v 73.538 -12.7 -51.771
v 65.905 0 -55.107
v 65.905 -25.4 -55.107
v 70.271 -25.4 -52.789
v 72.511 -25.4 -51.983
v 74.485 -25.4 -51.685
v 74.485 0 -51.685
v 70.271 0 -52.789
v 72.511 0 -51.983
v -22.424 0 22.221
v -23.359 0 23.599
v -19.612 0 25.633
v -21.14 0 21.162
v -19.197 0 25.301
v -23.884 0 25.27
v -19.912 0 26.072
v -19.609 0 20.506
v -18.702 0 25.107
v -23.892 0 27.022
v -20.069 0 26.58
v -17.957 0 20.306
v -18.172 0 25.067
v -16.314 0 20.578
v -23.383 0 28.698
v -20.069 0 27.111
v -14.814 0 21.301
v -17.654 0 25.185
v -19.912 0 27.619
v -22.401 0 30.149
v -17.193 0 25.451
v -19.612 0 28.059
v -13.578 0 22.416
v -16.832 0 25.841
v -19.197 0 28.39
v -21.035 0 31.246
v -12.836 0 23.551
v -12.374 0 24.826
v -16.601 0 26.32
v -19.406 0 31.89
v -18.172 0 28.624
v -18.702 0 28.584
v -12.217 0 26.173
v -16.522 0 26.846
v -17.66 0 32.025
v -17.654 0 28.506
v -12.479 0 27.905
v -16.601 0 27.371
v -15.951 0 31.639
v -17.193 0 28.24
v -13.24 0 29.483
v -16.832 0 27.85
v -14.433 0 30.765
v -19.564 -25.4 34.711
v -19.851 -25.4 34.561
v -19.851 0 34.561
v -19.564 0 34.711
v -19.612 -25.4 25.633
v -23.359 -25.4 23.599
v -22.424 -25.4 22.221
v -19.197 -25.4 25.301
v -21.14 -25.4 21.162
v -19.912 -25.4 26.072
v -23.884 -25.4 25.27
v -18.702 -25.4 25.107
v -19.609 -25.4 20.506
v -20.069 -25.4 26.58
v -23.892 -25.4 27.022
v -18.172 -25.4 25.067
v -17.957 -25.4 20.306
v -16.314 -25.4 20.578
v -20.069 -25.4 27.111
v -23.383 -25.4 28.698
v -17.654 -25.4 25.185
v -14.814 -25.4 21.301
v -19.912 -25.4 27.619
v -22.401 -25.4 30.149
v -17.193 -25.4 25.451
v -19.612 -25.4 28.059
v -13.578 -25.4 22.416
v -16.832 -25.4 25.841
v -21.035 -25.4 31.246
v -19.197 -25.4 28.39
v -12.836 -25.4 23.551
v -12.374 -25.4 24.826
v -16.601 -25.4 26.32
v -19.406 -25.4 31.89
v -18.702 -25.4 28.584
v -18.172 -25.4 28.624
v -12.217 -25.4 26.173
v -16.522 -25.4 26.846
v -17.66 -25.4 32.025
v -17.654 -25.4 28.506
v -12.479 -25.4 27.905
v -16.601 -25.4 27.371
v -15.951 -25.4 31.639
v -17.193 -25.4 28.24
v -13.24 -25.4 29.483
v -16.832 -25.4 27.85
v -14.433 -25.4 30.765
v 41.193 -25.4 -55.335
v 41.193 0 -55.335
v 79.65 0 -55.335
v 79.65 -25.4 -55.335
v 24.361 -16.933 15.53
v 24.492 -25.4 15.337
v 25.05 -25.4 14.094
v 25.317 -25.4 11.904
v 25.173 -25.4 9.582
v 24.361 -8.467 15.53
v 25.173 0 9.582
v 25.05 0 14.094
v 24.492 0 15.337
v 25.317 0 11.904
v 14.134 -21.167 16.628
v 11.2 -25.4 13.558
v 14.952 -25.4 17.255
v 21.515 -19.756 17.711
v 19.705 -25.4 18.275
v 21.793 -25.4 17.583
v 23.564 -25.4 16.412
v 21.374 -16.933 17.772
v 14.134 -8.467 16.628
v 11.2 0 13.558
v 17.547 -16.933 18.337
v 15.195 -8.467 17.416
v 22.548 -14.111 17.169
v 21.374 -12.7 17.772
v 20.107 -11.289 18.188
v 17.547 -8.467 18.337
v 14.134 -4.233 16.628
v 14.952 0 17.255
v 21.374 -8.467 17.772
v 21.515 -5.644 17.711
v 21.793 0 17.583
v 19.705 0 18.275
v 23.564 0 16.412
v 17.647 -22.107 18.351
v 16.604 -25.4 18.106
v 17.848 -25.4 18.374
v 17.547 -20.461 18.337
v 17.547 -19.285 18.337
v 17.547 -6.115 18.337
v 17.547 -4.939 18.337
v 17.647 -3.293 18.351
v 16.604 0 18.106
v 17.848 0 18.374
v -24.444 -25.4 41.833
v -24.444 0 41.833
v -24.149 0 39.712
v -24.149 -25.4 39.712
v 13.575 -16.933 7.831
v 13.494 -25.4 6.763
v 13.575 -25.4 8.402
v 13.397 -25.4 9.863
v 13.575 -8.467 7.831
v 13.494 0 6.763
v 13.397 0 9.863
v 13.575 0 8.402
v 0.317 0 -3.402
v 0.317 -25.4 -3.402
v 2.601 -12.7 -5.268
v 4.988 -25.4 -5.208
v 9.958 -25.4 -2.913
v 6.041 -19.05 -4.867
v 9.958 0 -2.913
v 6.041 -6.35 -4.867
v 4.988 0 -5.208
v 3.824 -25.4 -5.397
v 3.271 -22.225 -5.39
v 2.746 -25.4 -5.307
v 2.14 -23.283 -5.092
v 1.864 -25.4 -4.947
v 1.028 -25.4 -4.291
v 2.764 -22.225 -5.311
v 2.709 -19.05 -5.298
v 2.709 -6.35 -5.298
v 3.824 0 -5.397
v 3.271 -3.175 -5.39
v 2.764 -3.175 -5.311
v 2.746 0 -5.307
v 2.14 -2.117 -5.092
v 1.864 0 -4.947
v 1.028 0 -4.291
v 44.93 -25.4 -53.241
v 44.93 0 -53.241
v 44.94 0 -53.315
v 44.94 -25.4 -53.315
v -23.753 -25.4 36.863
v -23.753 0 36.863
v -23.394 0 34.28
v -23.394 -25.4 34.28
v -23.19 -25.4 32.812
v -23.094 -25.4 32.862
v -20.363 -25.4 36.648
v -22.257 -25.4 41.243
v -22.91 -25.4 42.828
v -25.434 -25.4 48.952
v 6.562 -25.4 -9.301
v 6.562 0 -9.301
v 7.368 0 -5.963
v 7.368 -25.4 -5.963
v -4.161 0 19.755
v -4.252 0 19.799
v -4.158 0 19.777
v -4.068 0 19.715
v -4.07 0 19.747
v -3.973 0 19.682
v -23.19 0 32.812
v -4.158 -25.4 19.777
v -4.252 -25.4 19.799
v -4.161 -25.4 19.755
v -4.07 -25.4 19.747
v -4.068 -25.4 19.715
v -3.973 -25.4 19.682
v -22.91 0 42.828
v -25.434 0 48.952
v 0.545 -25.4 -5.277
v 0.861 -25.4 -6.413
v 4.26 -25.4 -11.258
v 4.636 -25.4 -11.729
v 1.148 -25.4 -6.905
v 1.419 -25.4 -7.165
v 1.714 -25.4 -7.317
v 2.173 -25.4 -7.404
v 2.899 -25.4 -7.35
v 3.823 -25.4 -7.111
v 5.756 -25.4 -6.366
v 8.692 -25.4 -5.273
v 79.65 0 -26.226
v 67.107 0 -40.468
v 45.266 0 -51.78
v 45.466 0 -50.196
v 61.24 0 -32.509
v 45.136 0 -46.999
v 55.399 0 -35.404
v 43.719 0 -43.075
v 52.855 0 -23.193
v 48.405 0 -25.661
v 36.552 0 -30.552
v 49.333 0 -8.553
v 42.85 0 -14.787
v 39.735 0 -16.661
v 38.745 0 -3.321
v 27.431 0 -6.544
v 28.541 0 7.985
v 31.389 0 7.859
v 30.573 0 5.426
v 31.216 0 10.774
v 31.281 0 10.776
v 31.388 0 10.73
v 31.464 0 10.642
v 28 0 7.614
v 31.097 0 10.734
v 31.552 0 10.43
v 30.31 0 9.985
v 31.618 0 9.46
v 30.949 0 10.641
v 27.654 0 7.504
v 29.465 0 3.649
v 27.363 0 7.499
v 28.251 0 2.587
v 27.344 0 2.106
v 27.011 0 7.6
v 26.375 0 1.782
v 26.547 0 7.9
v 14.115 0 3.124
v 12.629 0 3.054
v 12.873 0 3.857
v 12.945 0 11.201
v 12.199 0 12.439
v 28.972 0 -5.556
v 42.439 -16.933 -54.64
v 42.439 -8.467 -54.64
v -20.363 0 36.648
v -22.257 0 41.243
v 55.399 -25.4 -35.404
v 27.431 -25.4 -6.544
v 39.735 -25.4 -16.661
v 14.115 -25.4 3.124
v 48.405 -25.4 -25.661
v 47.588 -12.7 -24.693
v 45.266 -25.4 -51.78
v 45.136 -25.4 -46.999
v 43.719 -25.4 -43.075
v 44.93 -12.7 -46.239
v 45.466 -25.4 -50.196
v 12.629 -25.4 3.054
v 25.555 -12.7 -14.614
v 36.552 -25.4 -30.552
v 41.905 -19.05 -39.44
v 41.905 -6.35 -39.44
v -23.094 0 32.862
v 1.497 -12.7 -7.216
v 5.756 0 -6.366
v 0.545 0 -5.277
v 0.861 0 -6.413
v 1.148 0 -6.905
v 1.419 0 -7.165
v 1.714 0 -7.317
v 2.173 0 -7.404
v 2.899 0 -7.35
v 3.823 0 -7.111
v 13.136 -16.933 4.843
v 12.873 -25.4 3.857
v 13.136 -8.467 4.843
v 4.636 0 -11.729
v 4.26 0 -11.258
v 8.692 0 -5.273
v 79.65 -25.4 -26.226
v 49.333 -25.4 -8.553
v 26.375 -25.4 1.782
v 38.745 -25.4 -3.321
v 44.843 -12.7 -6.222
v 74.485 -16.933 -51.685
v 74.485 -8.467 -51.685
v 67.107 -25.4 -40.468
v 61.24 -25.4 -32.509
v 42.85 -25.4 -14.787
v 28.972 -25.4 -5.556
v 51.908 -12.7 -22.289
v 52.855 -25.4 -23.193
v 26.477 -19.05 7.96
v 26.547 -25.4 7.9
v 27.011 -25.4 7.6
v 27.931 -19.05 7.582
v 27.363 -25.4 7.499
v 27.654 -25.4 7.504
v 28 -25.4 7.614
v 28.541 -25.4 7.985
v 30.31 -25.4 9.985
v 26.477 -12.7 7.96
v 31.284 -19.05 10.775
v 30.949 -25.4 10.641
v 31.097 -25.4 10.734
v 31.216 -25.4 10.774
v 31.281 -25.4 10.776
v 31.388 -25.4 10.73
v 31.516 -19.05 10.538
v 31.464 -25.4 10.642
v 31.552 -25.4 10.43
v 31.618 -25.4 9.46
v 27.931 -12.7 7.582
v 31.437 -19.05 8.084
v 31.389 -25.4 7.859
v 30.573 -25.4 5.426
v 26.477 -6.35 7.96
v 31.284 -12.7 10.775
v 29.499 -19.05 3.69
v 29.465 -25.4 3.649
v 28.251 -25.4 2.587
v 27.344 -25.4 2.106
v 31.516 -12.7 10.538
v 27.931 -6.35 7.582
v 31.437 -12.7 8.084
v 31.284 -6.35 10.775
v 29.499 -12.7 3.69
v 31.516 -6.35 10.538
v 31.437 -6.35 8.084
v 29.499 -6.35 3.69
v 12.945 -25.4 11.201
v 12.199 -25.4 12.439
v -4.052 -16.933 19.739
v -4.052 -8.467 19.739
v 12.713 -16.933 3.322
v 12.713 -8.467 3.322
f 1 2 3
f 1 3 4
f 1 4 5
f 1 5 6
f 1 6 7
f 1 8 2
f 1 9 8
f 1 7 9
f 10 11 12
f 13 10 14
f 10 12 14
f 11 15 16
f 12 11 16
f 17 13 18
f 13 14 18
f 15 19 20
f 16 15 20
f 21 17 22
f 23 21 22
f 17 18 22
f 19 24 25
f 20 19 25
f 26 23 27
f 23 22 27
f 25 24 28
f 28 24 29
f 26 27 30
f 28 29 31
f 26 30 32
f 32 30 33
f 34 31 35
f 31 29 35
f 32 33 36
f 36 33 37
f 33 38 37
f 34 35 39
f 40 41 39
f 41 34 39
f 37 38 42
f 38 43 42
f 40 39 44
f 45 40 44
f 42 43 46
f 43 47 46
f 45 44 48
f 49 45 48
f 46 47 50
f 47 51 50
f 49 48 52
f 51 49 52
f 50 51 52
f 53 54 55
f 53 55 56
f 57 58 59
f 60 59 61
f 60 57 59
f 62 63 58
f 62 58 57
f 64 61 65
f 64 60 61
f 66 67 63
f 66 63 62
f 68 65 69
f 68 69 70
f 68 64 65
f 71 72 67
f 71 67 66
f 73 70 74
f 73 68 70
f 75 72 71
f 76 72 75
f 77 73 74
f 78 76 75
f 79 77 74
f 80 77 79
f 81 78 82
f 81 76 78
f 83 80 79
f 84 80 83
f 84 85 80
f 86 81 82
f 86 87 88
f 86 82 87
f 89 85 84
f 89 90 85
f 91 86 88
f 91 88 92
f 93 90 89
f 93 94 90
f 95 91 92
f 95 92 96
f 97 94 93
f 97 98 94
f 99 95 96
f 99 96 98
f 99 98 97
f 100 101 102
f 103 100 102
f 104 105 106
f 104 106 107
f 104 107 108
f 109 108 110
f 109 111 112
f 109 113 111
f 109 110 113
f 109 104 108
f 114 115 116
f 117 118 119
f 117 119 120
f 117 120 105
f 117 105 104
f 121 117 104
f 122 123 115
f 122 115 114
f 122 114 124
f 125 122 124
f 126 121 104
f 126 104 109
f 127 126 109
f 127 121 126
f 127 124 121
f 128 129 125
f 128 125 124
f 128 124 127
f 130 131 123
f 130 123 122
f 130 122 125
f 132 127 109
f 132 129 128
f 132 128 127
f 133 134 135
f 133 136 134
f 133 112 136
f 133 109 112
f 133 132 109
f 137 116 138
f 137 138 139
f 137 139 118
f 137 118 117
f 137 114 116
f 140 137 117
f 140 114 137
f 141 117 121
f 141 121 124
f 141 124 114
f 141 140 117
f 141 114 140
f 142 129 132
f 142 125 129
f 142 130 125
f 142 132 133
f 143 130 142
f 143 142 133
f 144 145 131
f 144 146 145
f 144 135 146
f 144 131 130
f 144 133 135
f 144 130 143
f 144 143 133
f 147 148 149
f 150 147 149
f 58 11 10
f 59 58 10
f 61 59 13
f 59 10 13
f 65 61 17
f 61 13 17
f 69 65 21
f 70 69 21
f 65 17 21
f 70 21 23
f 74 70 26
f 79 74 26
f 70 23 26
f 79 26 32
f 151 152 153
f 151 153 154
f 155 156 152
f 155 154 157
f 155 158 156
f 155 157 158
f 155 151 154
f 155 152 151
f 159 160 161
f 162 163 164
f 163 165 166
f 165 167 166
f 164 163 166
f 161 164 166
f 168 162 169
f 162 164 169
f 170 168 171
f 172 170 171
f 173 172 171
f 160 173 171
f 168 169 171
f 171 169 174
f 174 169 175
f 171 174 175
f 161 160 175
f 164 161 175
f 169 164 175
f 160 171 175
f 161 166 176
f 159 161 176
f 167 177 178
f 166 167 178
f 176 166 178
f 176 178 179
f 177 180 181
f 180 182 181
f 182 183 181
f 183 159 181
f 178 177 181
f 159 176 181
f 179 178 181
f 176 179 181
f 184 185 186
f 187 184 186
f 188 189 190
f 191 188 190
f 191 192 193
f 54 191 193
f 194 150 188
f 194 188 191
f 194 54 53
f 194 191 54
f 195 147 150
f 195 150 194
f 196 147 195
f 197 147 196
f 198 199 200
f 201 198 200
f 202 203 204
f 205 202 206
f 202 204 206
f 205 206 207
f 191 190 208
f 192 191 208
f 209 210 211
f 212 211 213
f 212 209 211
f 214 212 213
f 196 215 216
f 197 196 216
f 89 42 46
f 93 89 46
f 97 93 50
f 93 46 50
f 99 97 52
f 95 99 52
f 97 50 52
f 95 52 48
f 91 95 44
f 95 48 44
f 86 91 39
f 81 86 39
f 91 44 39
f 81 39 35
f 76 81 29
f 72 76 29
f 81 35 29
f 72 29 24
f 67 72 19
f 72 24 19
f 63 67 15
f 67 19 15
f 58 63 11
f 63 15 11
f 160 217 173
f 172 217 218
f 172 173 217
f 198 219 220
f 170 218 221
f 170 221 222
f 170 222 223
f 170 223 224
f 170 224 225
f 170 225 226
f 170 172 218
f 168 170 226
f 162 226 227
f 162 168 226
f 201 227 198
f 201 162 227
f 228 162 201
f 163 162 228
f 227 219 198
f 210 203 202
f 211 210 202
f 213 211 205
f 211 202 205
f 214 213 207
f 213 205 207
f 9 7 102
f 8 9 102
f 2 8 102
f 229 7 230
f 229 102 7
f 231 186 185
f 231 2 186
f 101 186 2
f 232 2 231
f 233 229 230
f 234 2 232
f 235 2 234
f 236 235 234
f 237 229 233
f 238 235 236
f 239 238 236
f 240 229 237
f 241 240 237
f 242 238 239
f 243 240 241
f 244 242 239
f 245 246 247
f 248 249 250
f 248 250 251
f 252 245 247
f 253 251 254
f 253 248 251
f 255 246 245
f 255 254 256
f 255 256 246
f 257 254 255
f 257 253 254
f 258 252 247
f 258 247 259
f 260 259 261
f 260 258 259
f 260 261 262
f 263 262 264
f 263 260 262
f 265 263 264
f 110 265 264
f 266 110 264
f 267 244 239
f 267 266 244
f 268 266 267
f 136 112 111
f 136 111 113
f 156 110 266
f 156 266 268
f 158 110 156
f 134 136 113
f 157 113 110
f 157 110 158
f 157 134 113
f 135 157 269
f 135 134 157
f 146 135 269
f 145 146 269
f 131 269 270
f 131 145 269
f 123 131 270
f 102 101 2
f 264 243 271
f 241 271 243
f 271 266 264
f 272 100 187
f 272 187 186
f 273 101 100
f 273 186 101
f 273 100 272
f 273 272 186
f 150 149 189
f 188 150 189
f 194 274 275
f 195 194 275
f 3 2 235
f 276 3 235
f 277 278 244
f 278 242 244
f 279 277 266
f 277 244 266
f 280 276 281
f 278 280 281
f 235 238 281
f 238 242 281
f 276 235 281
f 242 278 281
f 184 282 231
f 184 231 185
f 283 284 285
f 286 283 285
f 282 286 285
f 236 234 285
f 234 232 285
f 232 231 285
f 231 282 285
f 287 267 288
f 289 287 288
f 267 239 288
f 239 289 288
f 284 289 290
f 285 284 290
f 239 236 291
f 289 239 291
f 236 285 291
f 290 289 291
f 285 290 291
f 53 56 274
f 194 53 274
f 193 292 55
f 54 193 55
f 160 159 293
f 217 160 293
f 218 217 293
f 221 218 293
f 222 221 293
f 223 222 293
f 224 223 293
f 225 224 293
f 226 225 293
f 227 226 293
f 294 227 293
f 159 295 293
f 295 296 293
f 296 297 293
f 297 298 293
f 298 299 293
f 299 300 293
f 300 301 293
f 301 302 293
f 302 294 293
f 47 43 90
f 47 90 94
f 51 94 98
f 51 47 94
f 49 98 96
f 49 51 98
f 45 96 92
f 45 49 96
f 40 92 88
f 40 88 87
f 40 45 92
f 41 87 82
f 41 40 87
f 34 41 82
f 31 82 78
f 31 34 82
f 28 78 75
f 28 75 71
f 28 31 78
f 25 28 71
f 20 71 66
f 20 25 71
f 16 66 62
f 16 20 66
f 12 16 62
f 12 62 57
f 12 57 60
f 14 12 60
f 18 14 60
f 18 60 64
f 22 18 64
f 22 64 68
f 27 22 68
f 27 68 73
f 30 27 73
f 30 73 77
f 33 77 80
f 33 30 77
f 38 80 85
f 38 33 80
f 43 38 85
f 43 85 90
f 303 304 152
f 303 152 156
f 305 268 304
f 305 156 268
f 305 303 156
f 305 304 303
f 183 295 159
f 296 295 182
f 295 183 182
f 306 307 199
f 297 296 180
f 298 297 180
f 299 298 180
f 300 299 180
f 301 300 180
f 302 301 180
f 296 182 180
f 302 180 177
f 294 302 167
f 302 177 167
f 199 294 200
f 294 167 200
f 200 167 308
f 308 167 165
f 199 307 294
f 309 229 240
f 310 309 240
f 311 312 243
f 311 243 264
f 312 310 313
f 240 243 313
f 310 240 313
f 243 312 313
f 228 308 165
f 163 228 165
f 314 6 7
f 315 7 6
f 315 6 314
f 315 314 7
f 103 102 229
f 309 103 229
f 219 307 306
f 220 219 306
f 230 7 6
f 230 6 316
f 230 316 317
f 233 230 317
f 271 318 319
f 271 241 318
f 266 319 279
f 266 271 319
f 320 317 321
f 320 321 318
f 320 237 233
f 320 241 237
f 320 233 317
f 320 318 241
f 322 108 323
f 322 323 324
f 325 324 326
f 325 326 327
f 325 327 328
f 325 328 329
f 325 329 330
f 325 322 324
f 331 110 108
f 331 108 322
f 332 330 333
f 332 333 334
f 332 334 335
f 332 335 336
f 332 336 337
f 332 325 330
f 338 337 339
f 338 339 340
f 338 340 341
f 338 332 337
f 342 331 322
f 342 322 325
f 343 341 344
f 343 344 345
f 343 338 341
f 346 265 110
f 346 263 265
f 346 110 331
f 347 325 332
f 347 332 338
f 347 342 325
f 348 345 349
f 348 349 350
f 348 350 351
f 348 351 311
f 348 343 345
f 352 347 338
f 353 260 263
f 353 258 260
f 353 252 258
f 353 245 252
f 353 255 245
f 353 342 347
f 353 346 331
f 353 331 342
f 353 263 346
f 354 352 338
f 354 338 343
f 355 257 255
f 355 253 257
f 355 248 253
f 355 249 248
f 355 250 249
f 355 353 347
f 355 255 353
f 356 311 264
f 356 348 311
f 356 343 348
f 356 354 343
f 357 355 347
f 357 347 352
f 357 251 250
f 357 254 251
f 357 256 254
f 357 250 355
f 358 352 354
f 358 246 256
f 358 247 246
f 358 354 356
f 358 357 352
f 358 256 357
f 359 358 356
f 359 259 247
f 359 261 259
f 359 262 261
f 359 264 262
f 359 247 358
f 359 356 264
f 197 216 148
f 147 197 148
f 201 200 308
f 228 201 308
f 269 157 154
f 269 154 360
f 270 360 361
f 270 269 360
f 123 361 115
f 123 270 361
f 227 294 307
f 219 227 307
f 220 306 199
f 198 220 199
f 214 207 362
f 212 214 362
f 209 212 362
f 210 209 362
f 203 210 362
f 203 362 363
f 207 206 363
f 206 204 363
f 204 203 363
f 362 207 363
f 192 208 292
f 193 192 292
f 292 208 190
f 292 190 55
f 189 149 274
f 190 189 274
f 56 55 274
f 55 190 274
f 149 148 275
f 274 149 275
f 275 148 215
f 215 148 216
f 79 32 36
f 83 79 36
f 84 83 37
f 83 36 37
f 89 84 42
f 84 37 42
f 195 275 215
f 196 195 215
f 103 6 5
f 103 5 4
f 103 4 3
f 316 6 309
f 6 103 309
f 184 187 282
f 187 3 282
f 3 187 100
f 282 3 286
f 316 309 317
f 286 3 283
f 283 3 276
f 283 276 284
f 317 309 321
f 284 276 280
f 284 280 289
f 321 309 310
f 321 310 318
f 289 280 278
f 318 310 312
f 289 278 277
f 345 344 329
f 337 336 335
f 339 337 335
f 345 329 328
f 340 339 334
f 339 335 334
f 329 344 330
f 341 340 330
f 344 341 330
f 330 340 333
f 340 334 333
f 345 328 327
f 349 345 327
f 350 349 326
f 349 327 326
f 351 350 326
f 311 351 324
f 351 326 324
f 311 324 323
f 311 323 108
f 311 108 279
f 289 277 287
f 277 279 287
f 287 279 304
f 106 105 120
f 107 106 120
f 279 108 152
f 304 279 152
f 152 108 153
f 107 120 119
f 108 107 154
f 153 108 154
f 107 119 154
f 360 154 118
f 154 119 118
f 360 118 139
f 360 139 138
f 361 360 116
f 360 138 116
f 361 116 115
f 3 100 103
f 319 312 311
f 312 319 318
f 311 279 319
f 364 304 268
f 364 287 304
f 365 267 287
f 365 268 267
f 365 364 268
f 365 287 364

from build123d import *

# Parameters (mm, degrees)
F1_DEPTH = 25.4
F0_R     = 1.7834628767


with BuildPart() as f1:
    # F0 (on Front) → F1 (new body)
    with BuildSketch(Plane.XZ):
        Polygon((-22.9100676942, 42.8284476999), (-25.4338644445, 48.9523671567), (-24.4440726353, 41.833478334), align=None)
        Polygon((-22.9100676942, 42.8284476999), (-24.4440726353, 41.833478334), (-24.1491642219, 39.7124058128), (-22.2565439392, 41.242691304), align=None)
        Polygon((-22.2565439392, 41.242691304), (-24.1491642219, 39.7124058128), (-23.7530106851, 36.8631470503), (-21.2160514777, 38.7179665895), align=None)
        Polygon((-21.2160514777, 38.7179665895), (-23.7530106851, 36.8631470503), (-23.3938598176, 34.2800229301), (-20.3630941983, 36.6482905434), align=None)
        with BuildLine():
            Line((-20.3630941983, 36.6482905434), (-23.3938598176, 34.2800229301))
            Line((-23.3938598176, 34.2800229301), (-23.1896936893, 32.8115969896))
            Line((-23.1896936893, 32.8115969896), (-23.0944005255, 32.861512475))
            ThreePointArc((-23.0944005255, 32.861512475), (-21.536076112, 33.8323842773), (-19.8506553661, 34.5606177173))
            Line((-19.8506553661, 34.5606177173), (-19.5644944906, 34.7105115652))
            Line((-19.5644944906, 34.7105115652), (-20.3630941983, 36.6482905434))
        make_face()
        with BuildLine():
            ThreePointArc((-19.8506553661, 34.5606177173), (-21.536076112, 33.8323842773), (-23.0944005255, 32.861512475))
            Line((-23.0944005255, 32.861512475), (-19.8506553661, 34.5606177173))
        make_face()
    extrude(amount=F1_DEPTH)


with BuildPart() as f1b:
    # F0 (on Front) → F1, piece 2 (new body)
    with BuildSketch(Plane.XZ):
        with BuildLine():
            Line((7.3678023182, -5.9633478522), (8.6915092543, -5.2727186121))
            Line((8.6915092543, -5.2727186121), (9.9576627836, -2.9130687471))
            add(Edge.make_bspline(
                [(9.9576627836, -2.9130687471), (7.2934083331, -4.3884854622), (3.4390867087, -6.5229402058), (0.9154172603, -4.321786708), (0.3169151371, -3.4018067018)],
                knots=[0, 0, 0, 0, 0.2804208607, 0.4056790399, 0.4056790399, 0.4056790399, 0.4056790399], degree=3))
            add(Edge.make_bspline(
                [(0.3169151371, -3.4018067018), (0.4735126403, -5.0509317641), (0.7934307177, -8.4199824116), (4.079017662, -7.0603283138), (5.7563344017, -6.3662147149)],
                knots=[0, 0, 0, 0, 0.4894925113, 1, 1, 1, 1], degree=3))
            Line((5.7563344017, -6.3662147149), (7.3678023182, -5.9633478522))
        make_face()
        Polygon((6.5620685928, -9.3013895676), (7.3678023182, -5.9633478522), (5.7563344017, -6.3662147149), (4.2599714361, -11.2581718713), (4.6356988207, -11.7292987501), align=None)
    extrude(amount=F1_DEPTH)


with BuildPart() as f1c:
    # F0 (on Front) → F1, piece 3 (new body)
    with BuildSketch(Plane.XZ):
        with BuildLine():
            add(Edge.make_bspline(
                [(11.1995394877, 13.5578365372), (13.102668093, 15.7551518419), (16.8397830976, 20.0703916826), (25.7752520583, 16.2097157192), (25.3665615723, 11.7141237547), (25.172656402, 9.5816049725)],
                knots=[0, 0, 0, 0, 0.3530775685, 0.6931085154, 1, 1, 1, 1], degree=3))
            add(Edge.make_bspline(
                [(13.3967538173, 9.8631651647), (13.3099779159, 10.2531594082), (12.8857542425, 11.599367998), (11.9969733927, 12.8016439042), (11.1995394877, 13.5578365372)],
                knots=[0.3052767295, 0.3052767295, 0.3052767295, 0.3052767295, 0.3430149898, 0.4390412883, 0.4390412883, 0.4390412883, 0.4390412883], degree=3))
            add(Edge.make_bspline(
                [(26.3748617337, 1.7824834694), (24.4786632438, 1.3069342857), (19.4102807977, 2.0805751093), (16.182781783, 6.7144995217), (15.164352776, 10.8239090423), (13.8978703904, 10.1356632019), (13.3967538173, 9.8631651647)],
                knots=[0.5136939443, 0.5136939443, 0.5136939443, 0.5136939443, 0.6337715162, 0.8018048617, 0.9214431496, 1, 1, 1, 1], degree=3))
            add(Edge.make_bspline(
                [(25.172656402, 9.5816049725), (26.0256189076, 8.3626269027), (27.8732100394, 5.7222122761), (32.53464609, 14.3338237837), (31.2517450854, 4.1198016009), (27.5567602879, 2.078892783), (26.3748617337, 1.7824834694)],
                knots=[0, 0, 0, 0, 0.1208801505, 0.2618084346, 0.4388497182, 0.5136939443, 0.5136939443, 0.5136939443, 0.5136939443], degree=3))
        make_face()
        with BuildLine():
            add(Edge.make_bspline(
                [(26.3748617337, 1.7824834694), (24.4786632438, 1.3069342857), (19.4102807977, 2.0805751093), (16.182781783, 6.7144995217), (15.164352776, 10.8239090423), (13.8978703904, 10.1356632019), (13.3967538173, 9.8631651647)],
                knots=[0.5136939443, 0.5136939443, 0.5136939443, 0.5136939443, 0.6337715162, 0.8018048617, 0.9214431496, 1, 1, 1, 1], degree=3))
            add(Edge.make_bspline(
                [(13.4936010892, 6.7625090508), (13.6249872982, 7.8467701656), (13.6139755122, 8.8869124365), (13.3967538173, 9.8631651647)],
                knots=[0.2108084645, 0.2108084645, 0.2108084645, 0.2108084645, 0.3052767295, 0.3052767295, 0.3052767295, 0.3052767295], degree=3))
            add(Edge.make_bspline(
                [(23.6649847588, 0.4353575829), (20.3023370373, 2.540814331), (16.8979690633, 4.6516616909), (13.4936010892, 6.7625090508)],
                knots=[0.8849952308, 0.8849952308, 0.8849952308, 0.8849952308, 1, 1, 1, 1], degree=3))
            add(Edge.make_bspline(
                [(79.6498671174, -32.3402956128), (70.7382485823, -25.6757973438), (53.0737396883, -12.4655046811), (33.4090025187, -3.8390916864), (23.6649847588, 0.4353575829)],
                knots=[0, 0, 0, 0, 0.5044928556, 1, 1, 1, 1], degree=3))
            Line((79.6498671174, -32.3402956128), (79.6498671174, -26.2255966663))
            add(Edge.make_bspline(
                [(79.6498671174, -26.2255966663), (67.195591653, -18.7096857526), (45.9244782641, -5.8679201366), (32.1042021144, -0.4631162389), (26.3748617337, 1.7824834694)],
                knots=[0, 0, 0, 0, 0.5854506367, 1, 1, 1, 1], degree=3))
        make_face()
        with BuildLine():
            add(Edge.make_bspline(
                [(23.6649847588, 0.4353575829), (20.3023370373, 2.540814331), (16.8979690633, 4.6516616909), (13.4936010892, 6.7625090508)],
                knots=[0.8849952308, 0.8849952308, 0.8849952308, 0.8849952308, 1, 1, 1, 1], degree=3))
            add(Edge.make_bspline(
                [(12.8726503511, 3.8568314283), (13.1589002344, 4.8499495328), (13.3797309677, 5.8227989722), (13.4936010892, 6.7625090508)],
                knots=[0.1289344772, 0.1289344772, 0.1289344772, 0.1289344772, 0.2108084645, 0.2108084645, 0.2108084645, 0.2108084645], degree=3))
            Line((12.8726503511, 3.8568314283), (14.1145518273, 3.1241918572))
            add(Edge.make_bspline(
                [(74.4853538034, -51.6848177491), (67.8697829303, -41.3749614778), (53.9210289847, -19.6369057455), (27.830793174, -4.7186701674), (14.1145518273, 3.1241918572)],
                knots=[0, 0, 0, 0, 0.474276835, 1, 1, 1, 1], degree=3))
            add(Edge.make_bspline(
                [(74.4853538034, -51.6848177491), (75.2532722885, -50.5569895458), (76.7194981017, -48.4351104873), (78.7055638503, -47.4397782041), (79.6498671174, -46.9699688256)],
                knots=[0, 0, 0, 0, 0.5257876641, 1, 1, 1, 1], degree=3))
            Line((79.6498671174, -46.9699688256), (79.6498671174, -45.374263078))
            add(Edge.make_bspline(
                [(79.6498671174, -45.374263078), (73.9639050001, -38.5749047223), (61.908256077, -24.1585798245), (37.3370442092, -8.1251376623), (23.6649847588, 0.4353575829)],
                knots=[0, 0, 0, 0, 0.417401783, 0.8849952308, 0.8849952308, 0.8849952308, 0.8849952308], degree=3))
        make_face()
        with BuildLine():
            Line((14.1145518273, 3.1241918572), (12.8726503511, 3.8568314283))
            add(Edge.make_bspline(
                [(12.629107162, 3.0539237688), (12.7144569126, 3.3228512302), (12.7959048356, 3.5905697973), (12.8726503511, 3.8568314283)],
                knots=[0.1069835115, 0.1069835115, 0.1069835115, 0.1069835115, 0.1289344772, 0.1289344772, 0.1289344772, 0.1289344772], degree=3))
            add(Edge.make_bspline(
                [(12.629107162, 3.0539237688), (27.4083446688, -16.9764718508), (47.2608873564, -43.8966934003), (45.4056145875, -51.3340987373), (44.9297228388, -53.2412977891)],
                knots=[0.0008687497, 0.0008687497, 0.0008687497, 0.0008687497, 0.743798112, 1, 1, 1, 1], degree=3))
            Line((44.9297228388, -53.2412977891), (44.9400234568, -53.3147102781))
            add(Edge.make_bspline(
                [(44.9400234568, -53.3147102781), (47.4482459083, -52.0674234641), (50.7039411921, -50.8505914393), (54.1312274801, -51.0922982039), (54.888123322, -51.2028494127)],
                knots=[0.1612518221, 0.1612518221, 0.1612518221, 0.1612518221, 0.4835534699, 0.5738587509, 0.5738587509, 0.5738587509, 0.5738587509], degree=3))
            add(Edge.make_bspline(
                [(14.1145518273, 3.1241918572), (23.6649847588, -6.2222828756), (41.6151411246, -23.7840879693), (50.6549721415, -42.468973353), (54.888123322, -51.2028494127)],
                knots=[0, 0, 0, 0, 0.5320886171, 1, 1, 1, 1], degree=3))
        make_face()
        with BuildLine():
            add(Edge.make_bspline(
                [(79.6498671174, -32.3402956128), (70.7382485823, -25.6757973438), (53.0737396883, -12.4655046811), (33.4090025187, -3.8390916864), (23.6649847588, 0.4353575829)],
                knots=[0, 0, 0, 0, 0.5044928556, 1, 1, 1, 1], degree=3))
            add(Edge.make_bspline(
                [(79.6498671174, -45.374263078), (73.9639050001, -38.5749047223), (61.908256077, -24.1585798245), (37.3370442092, -8.1251376623), (23.6649847588, 0.4353575829)],
                knots=[0, 0, 0, 0, 0.417401783, 0.8849952308, 0.8849952308, 0.8849952308, 0.8849952308], degree=3))
            Line((79.6498671174, -45.374263078), (79.6498671174, -32.3402956128))
        make_face()
        with BuildLine():
            add(Edge.make_bspline(
                [(65.9053176641, -55.1066324115), (60.7417418721, -44.5506167606), (49.8610787063, -22.3070291197), (26.4274262129, -5.6355802577), (14.1145518273, 3.1241918572)],
                knots=[0, 0, 0, 0, 0.4745644372, 1, 1, 1, 1], degree=3))
            add(Edge.make_bspline(
                [(14.1145518273, 3.1241918572), (23.6649847588, -6.2222828756), (41.6151411246, -23.7840879693), (50.6549721415, -42.468973353), (54.888123322, -51.2028494127)],
                knots=[0, 0, 0, 0, 0.5320886171, 1, 1, 1, 1], degree=3))
            add(Edge.make_bspline(
                [(54.888123322, -51.2028494127), (54.9170193728, -51.2070699318), (54.9459253088, -51.211374475), (54.9748410499, -51.2157623627)],
                knots=[0.5738587509, 0.5738587509, 0.5738587509, 0.5738587509, 0.5773063402, 0.5773063402, 0.5773063402, 0.5773063402], degree=3))
            add(Edge.make_bspline(
                [(54.9748410499, -51.2157623627), (58.5200720553, -51.753741842), (62.2126948597, -53.5445647148), (65.9053176641, -55.3353875875)],
                knots=[0.5773063402, 0.5773063402, 0.5773063402, 0.5773063402, 1, 1, 1, 1], degree=3))
            Line((65.9053176641, -55.3353875875), (65.9053176641, -55.1066324115))
        make_face()
        with BuildLine():
            add(Edge.make_bspline(
                [(54.888123322, -51.2028494127), (54.9170193728, -51.2070699318), (54.9459253088, -51.211374475), (54.9748410499, -51.2157623627)],
                knots=[0.5738587509, 0.5738587509, 0.5738587509, 0.5738587509, 0.5773063402, 0.5773063402, 0.5773063402, 0.5773063402], degree=3))
            add(Edge.make_bspline(
                [(44.9400234568, -53.3147102781), (47.4482459083, -52.0674234641), (50.7039411921, -50.8505914393), (54.1312274801, -51.0922982039), (54.888123322, -51.2028494127)],
                knots=[0.1612518221, 0.1612518221, 0.1612518221, 0.1612518221, 0.4835534699, 0.5738587509, 0.5738587509, 0.5738587509, 0.5738587509], degree=3))
            add(Edge.make_bspline(
                [(41.1928109825, -55.3353875875), (42.4389686118, -54.6370660645), (43.6851262412, -53.9387445415), (44.9400234568, -53.3147102781)],
                knots=[0, 0, 0, 0, 0.1612518221, 0.1612518221, 0.1612518221, 0.1612518221], degree=3))
            Line((41.1928109825, -55.3353875875), (65.9053176641, -55.3353875875))
            add(Edge.make_bspline(
                [(54.9748410499, -51.2157623627), (58.5200720553, -51.753741842), (62.2126948597, -53.5445647148), (65.9053176641, -55.3353875875)],
                knots=[0.5773063402, 0.5773063402, 0.5773063402, 0.5773063402, 1, 1, 1, 1], degree=3))
        make_face()
        with BuildLine():
            add(Edge.make_bspline(
                [(65.9053176641, -55.1066324115), (68.4963599489, -53.6194818578), (71.4236801138, -51.939321781), (74.171551606, -51.696600774), (74.4852046249, -51.6848233494)],
                knots=[0, 0, 0, 0, 0.5377271346, 0.6075159382, 0.6075159382, 0.6075159382, 0.6075159382], degree=3))
            Line((65.9053176641, -55.1066324115), (65.9053176641, -55.3353875875))
            Line((65.9053176641, -55.3353875875), (79.6498671174, -55.3353875875))
            Line((79.6498671174, -55.3353875875), (79.6498671174, -52.5048784912))
            add(Edge.make_bspline(
                [(74.4858599757, -51.6847987648), (76.2495736403, -51.6186982522), (77.9497203789, -52.0617883717), (79.6498671174, -52.5048784912)],
                knots=[0.6075645443, 0.6075645443, 0.6075645443, 0.6075645443, 1, 1, 1, 1], degree=3))
            add(Edge.make_bspline(
                [(74.4853538034, -51.6848177491), (74.4855225281, -51.6848114163), (74.4856912522, -51.6848050882), (74.4858599757, -51.6847987648)],
                knots=[0.6075270024, 0.6075270024, 0.6075270024, 0.6075270024, 0.6075645443, 0.6075645443, 0.6075645443, 0.6075645443], degree=3))
            add(Edge.make_bspline(
                [(74.4852046249, -51.6848233494), (74.4852543511, -51.6848214822), (74.4853040773, -51.6848196154), (74.4853538034, -51.6848177491)],
                knots=[0.6075159382, 0.6075159382, 0.6075159382, 0.6075159382, 0.6075270024, 0.6075270024, 0.6075270024, 0.6075270024], degree=3))
        make_face()
        with BuildLine():
            add(Edge.make_bspline(
                [(74.4853538034, -51.6848177491), (75.2532722885, -50.5569895458), (76.7194981017, -48.4351104873), (78.7055638503, -47.4397782041), (79.6498671174, -46.9699688256)],
                knots=[0, 0, 0, 0, 0.5257876641, 1, 1, 1, 1], degree=3))
            add(Edge.make_bspline(
                [(74.4853538034, -51.6848177491), (74.4855225281, -51.6848114163), (74.4856912522, -51.6848050882), (74.4858599757, -51.6847987648)],
                knots=[0.6075270024, 0.6075270024, 0.6075270024, 0.6075270024, 0.6075645443, 0.6075645443, 0.6075645443, 0.6075645443], degree=3))
            add(Edge.make_bspline(
                [(74.4858599757, -51.6847987648), (76.2495736403, -51.6186982522), (77.9497203789, -52.0617883717), (79.6498671174, -52.5048784912)],
                knots=[0.6075645443, 0.6075645443, 0.6075645443, 0.6075645443, 1, 1, 1, 1], degree=3))
            Line((79.6498671174, -52.5048784912), (79.6498671174, -46.9699688256))
        make_face()
    extrude(amount=F1_DEPTH)


with BuildPart() as f1d:
    # F0 (on Front) → F1, piece 4 (new body)
    with BuildSketch(Plane.XZ):
        with BuildLine():
            ThreePointArc((-4.2518144473, 19.7993554175), (-4.1150908493, 19.7343010507), (-3.9729524271, 19.6821274765))
            add(Edge.make_bspline(
                [(-3.9729524271, 19.6821274765), (-4.0415578717, 19.7528149264), (-4.1466861595, 19.7760851719), (-4.2518144473, 19.7993554175)],
                knots=[0.862700932, 0.862700932, 0.862700932, 0.862700932, 1, 1, 1, 1], degree=3))
        make_face()
    extrude(amount=F1_DEPTH)


with BuildPart() as f1e:
    # F0 (on Front) → F1, piece 5 (new body)
    with BuildSketch(Plane.XZ):
        with BuildLine():
            ThreePointArc((-13.5775777234, 22.4159570644), (-12.5679432875, 24.1750060763), (-12.2174417016, 26.1726956815))
            ThreePointArc((-12.2174417016, 26.1726956815), (-19.4064470033, 31.8903004933), (-23.3592220436, 23.5988367206))
            Line((-23.3592220436, 23.5988367206), (-13.5775777234, 22.4159570644))
        make_face()
        with Locations((-18.3050855994, 26.8455650657)):
            Circle(F0_R, mode=Mode.SUBTRACT)
        with BuildLine():
            Line((-13.5775777234, 22.4159570644), (-23.3592220436, 23.5988367206))
            ThreePointArc((-23.3592220436, 23.5988367206), (-18.7901231875, 20.3469547136), (-13.5775777234, 22.4159570644))
        make_face()
    extrude(amount=F1_DEPTH)


solid = Compound([f1.part, f1b.part, f1c.part, f1d.part, f1e.part])
